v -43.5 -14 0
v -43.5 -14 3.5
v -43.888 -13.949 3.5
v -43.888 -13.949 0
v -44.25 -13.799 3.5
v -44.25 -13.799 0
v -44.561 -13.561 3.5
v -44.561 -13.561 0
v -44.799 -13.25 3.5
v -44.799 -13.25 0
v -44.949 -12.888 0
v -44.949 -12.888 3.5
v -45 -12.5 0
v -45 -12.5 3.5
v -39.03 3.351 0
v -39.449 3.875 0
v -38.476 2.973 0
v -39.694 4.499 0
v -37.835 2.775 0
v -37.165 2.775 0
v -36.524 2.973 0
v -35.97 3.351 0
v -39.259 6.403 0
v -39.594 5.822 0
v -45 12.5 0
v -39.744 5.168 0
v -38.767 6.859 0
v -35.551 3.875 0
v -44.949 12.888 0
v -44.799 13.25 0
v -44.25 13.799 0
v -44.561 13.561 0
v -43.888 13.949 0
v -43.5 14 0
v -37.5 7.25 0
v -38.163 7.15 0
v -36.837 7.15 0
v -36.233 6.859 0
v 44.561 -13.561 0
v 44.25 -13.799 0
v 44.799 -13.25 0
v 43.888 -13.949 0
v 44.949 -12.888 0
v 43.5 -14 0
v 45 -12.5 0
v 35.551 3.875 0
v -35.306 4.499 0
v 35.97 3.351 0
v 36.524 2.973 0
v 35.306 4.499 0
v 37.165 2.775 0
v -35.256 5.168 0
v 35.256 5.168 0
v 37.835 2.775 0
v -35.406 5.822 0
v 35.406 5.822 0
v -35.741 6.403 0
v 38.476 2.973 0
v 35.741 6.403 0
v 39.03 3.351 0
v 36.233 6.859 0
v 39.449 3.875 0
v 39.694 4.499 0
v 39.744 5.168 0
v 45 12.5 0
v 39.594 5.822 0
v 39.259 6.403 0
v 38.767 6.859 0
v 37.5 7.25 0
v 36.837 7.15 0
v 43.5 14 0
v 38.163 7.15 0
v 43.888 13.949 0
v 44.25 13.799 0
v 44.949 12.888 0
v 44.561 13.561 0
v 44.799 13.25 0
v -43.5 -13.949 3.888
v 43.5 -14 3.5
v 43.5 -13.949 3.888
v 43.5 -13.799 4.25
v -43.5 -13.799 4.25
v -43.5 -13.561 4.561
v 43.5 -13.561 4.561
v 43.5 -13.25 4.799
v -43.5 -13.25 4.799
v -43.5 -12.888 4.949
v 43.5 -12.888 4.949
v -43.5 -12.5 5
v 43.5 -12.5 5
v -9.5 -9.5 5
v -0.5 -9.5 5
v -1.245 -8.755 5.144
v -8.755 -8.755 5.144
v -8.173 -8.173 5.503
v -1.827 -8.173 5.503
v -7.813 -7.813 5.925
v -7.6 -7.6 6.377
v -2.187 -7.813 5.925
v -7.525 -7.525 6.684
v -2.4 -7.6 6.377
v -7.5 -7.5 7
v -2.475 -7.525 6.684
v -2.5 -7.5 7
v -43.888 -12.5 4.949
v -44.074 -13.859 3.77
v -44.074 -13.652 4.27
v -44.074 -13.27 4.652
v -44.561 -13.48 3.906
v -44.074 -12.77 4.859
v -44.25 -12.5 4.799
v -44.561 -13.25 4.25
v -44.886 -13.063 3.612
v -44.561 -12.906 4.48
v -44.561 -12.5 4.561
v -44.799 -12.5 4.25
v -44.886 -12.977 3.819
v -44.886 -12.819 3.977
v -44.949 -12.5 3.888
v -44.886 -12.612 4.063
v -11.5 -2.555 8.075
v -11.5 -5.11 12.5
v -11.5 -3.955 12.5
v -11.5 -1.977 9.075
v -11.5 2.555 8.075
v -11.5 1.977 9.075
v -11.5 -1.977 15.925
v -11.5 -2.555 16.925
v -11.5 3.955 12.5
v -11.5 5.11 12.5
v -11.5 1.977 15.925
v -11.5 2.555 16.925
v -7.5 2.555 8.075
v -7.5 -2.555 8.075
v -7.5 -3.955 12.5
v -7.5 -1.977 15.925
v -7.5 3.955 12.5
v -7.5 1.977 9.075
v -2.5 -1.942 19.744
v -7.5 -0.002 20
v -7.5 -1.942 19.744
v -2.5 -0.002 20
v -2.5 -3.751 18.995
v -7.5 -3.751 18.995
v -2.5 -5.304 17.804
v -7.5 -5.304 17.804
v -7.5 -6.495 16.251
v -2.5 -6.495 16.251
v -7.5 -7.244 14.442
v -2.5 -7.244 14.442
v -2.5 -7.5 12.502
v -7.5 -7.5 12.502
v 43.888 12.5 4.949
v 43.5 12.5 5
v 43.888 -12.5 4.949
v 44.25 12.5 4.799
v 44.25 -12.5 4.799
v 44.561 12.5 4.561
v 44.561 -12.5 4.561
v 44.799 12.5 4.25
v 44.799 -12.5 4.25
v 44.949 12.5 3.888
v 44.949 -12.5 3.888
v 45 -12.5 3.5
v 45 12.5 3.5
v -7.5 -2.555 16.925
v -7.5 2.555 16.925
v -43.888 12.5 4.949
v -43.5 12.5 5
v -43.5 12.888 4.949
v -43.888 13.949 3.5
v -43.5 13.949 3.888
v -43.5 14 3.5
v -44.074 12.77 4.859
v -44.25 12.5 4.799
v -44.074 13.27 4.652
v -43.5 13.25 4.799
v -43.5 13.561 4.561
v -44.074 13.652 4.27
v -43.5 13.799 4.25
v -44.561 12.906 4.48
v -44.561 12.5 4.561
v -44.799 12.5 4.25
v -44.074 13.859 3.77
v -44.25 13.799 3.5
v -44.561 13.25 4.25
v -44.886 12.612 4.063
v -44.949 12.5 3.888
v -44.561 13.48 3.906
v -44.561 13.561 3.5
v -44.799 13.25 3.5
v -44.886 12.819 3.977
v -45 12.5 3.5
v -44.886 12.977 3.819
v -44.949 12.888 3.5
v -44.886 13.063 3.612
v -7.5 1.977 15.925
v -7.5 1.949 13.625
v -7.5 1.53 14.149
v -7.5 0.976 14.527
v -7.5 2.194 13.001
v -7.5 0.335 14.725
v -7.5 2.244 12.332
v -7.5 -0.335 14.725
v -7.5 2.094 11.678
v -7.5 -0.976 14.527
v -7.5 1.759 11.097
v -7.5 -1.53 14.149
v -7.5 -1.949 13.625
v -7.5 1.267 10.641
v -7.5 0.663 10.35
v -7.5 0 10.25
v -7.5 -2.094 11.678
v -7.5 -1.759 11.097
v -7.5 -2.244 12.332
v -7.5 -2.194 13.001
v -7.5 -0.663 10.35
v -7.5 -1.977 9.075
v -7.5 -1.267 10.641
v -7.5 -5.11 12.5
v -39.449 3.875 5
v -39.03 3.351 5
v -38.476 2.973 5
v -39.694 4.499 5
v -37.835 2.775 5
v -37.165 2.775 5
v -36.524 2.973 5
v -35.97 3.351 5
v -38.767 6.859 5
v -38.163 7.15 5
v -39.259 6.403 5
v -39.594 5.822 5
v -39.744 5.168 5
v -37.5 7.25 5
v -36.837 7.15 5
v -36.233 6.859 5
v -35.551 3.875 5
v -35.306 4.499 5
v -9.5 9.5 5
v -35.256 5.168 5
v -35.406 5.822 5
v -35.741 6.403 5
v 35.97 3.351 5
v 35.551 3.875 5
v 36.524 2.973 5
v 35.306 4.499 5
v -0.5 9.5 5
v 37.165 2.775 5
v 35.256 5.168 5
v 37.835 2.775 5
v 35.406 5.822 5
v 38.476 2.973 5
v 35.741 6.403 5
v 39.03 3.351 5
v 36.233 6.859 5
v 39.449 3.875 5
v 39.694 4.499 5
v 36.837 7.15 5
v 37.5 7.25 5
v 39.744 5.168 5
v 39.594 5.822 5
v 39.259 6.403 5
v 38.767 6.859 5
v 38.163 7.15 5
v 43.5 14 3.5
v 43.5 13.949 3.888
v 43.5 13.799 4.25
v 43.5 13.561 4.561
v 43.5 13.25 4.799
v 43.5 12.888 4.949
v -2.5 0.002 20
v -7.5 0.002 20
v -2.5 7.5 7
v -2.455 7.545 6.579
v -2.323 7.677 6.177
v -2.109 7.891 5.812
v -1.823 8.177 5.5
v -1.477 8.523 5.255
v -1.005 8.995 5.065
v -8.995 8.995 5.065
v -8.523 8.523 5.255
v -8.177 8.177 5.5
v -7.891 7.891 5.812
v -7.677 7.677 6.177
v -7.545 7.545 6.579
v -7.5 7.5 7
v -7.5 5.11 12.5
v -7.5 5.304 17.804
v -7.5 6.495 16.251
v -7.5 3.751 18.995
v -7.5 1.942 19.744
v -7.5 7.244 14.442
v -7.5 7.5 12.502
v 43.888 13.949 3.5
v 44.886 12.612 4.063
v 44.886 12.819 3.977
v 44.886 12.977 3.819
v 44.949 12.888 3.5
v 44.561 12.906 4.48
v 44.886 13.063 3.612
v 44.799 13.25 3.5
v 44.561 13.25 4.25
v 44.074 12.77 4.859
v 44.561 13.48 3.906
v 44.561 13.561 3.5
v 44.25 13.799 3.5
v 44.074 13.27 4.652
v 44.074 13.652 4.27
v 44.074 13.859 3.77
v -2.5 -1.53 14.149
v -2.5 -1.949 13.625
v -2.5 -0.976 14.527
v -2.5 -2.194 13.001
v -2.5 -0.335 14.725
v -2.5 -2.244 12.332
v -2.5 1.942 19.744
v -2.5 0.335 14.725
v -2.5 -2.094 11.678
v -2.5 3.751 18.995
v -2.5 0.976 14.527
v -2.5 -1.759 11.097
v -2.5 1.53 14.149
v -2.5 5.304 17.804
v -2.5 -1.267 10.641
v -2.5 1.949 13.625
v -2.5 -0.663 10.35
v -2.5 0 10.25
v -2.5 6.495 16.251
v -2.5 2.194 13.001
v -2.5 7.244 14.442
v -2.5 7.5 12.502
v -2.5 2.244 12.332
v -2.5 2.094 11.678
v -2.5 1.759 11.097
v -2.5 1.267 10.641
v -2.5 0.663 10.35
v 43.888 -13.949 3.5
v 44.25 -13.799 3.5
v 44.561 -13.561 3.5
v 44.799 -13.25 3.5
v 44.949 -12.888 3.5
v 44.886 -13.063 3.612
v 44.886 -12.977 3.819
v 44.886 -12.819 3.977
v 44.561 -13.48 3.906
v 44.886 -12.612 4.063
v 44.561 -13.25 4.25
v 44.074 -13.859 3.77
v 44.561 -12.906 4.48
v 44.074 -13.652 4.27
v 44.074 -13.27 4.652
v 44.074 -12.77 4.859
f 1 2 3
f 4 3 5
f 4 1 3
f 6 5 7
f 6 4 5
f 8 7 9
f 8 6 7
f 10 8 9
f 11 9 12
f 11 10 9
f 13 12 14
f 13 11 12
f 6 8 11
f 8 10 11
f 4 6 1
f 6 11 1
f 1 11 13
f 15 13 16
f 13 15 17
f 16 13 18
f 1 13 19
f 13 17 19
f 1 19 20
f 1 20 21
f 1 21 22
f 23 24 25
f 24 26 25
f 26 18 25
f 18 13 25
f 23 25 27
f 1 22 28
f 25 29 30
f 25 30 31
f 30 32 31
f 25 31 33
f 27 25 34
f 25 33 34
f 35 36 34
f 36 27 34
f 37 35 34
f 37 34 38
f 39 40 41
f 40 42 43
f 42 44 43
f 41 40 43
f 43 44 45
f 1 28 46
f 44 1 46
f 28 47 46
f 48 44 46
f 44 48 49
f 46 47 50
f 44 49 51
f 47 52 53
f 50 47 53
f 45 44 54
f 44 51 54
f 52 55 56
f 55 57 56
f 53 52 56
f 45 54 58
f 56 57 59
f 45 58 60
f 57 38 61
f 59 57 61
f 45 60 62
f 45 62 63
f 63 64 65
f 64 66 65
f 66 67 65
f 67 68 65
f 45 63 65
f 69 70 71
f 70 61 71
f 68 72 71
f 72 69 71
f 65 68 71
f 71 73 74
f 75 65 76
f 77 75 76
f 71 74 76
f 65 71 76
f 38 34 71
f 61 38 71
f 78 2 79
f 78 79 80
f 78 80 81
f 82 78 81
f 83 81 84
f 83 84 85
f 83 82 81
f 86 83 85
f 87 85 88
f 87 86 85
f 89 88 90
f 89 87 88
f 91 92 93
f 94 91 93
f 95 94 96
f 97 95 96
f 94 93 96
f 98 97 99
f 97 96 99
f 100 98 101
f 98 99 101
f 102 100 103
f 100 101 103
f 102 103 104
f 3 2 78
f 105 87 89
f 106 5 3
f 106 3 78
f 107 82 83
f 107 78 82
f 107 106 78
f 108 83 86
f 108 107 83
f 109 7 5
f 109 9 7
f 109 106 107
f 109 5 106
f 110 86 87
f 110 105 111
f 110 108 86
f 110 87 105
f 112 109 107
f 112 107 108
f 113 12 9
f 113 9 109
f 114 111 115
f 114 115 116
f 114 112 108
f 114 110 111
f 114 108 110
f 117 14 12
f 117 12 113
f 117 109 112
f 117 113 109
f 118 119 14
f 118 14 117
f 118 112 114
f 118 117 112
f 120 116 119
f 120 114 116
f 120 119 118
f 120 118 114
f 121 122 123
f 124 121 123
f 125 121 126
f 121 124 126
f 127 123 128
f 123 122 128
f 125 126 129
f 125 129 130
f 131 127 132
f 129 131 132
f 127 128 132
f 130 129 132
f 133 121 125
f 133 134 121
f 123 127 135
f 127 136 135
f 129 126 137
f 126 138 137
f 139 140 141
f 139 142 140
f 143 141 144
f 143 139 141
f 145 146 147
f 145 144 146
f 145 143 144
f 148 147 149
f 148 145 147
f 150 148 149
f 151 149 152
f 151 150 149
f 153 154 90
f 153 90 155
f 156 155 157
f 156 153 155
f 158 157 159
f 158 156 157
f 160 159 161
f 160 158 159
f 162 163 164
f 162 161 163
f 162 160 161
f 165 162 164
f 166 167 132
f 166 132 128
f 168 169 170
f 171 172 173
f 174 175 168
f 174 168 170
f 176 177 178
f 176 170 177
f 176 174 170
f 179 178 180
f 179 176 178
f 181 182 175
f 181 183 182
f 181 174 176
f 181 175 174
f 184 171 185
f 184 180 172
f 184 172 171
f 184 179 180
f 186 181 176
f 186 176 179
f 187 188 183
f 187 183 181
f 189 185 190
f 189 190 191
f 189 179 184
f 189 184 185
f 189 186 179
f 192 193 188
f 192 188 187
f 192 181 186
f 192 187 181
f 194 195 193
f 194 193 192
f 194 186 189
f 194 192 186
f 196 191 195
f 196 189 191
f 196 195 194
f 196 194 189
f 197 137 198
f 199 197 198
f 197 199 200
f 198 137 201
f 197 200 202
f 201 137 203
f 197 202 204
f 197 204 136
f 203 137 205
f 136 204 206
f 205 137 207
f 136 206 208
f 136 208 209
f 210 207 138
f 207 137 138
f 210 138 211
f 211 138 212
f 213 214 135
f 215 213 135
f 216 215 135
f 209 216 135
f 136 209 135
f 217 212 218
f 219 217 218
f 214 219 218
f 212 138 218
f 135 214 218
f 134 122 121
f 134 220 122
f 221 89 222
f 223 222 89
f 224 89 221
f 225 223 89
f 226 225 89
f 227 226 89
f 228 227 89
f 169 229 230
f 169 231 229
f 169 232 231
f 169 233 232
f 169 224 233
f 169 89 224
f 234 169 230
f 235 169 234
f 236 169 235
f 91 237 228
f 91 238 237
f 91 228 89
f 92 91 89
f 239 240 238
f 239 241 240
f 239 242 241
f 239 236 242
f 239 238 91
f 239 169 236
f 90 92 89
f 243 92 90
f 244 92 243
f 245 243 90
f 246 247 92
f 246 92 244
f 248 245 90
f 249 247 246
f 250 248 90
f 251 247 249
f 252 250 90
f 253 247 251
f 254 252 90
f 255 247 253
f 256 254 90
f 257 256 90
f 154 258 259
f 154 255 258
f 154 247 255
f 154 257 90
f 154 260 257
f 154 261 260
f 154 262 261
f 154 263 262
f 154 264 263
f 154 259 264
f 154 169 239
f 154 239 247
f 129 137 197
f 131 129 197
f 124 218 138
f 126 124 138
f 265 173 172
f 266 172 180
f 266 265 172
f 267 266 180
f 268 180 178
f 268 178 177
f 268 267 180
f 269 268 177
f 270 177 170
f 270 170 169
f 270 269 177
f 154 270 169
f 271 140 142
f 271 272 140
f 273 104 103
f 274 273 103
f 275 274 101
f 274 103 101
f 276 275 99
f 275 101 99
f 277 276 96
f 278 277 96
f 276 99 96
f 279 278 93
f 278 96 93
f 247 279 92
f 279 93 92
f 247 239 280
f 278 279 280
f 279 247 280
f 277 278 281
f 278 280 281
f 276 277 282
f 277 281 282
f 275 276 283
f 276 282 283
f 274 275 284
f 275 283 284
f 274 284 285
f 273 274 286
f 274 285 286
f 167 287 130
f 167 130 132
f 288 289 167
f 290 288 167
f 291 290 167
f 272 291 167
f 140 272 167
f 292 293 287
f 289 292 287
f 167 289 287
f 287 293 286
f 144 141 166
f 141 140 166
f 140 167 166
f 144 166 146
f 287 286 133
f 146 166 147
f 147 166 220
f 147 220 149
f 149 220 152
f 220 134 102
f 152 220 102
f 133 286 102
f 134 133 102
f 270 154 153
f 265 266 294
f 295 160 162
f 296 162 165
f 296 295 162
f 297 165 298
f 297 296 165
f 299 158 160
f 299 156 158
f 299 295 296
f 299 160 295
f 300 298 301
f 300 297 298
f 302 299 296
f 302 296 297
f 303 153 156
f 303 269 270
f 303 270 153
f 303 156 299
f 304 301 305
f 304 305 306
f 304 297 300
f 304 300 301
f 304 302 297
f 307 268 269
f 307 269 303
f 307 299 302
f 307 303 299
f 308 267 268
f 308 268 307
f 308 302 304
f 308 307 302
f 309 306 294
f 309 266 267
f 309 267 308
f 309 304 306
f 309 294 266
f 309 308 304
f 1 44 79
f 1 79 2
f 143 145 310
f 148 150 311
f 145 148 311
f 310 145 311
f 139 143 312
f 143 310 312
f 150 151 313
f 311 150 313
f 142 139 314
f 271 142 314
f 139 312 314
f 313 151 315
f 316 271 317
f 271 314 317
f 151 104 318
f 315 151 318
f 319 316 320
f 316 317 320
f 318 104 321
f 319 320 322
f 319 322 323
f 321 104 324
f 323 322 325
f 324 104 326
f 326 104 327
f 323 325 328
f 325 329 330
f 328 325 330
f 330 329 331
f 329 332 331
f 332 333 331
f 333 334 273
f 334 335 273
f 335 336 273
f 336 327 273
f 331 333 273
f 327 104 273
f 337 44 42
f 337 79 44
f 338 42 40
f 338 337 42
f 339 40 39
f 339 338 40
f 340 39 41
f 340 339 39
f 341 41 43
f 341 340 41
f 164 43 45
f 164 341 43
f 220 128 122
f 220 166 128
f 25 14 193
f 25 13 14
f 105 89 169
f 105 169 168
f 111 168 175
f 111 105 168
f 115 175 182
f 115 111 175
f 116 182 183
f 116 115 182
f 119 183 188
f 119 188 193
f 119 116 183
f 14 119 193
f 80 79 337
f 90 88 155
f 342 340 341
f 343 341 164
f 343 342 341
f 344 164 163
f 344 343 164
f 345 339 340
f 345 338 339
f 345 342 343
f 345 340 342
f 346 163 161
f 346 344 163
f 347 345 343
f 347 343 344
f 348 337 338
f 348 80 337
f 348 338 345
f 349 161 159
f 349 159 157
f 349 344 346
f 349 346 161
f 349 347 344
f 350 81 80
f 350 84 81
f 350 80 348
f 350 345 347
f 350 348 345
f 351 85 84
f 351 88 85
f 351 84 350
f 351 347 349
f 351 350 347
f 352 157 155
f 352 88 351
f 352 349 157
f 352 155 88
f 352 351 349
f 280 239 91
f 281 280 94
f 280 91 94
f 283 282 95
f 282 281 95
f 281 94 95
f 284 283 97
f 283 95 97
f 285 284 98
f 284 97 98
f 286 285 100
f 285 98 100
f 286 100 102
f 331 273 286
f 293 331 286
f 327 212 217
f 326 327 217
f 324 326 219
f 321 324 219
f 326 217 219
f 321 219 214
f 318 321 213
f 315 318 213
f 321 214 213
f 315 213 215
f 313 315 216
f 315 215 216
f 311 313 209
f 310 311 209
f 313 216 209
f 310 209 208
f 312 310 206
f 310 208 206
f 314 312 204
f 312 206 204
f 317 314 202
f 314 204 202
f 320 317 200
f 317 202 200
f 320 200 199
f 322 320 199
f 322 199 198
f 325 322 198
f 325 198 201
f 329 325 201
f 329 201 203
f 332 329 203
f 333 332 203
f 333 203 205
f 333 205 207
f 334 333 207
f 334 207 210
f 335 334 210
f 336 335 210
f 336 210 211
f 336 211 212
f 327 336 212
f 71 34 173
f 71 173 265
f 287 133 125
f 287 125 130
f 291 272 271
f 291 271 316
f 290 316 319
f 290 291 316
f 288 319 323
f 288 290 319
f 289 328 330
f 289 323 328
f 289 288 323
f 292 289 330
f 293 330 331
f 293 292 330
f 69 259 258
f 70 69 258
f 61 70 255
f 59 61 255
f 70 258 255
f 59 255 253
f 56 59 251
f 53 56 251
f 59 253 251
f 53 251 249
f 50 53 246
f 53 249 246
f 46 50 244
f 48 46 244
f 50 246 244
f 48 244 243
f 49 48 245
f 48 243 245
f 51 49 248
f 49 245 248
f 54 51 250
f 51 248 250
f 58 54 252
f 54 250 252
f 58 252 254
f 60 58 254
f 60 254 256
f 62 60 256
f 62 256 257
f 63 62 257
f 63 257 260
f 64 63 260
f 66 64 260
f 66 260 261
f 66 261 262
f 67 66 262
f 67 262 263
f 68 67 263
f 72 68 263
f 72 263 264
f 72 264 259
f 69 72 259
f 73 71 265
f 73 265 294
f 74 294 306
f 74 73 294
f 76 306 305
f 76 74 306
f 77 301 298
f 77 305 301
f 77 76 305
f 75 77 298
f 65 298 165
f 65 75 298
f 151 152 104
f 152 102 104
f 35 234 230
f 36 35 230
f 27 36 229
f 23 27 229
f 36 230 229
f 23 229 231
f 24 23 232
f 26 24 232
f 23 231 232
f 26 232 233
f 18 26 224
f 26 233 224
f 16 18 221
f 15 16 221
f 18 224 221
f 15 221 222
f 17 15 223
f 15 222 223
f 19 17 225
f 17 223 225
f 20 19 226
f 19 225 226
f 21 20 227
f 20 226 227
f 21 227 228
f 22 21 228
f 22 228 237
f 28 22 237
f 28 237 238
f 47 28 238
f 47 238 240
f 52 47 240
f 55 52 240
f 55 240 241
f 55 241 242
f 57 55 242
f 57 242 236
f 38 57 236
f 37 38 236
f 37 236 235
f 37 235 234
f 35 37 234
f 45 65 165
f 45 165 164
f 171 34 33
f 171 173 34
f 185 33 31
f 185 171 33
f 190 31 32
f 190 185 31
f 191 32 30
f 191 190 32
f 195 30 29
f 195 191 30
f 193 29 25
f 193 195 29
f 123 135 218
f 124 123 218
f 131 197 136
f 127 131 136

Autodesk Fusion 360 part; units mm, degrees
sketch "Sketch1" plane through (0, 0, 0) normal (0, 0, 1) x (1, 0, 0)
  line L0 (-45, 14) -> (45, 14)
  line L1 (45, 14) -> (45, -14)
  line L2 (45, -14) -> (-45, -14)
  line L3 (-45, -14) -> (-45, 14)
  line L4 (-45, 14) -> (45, -14) construction
  line L5 (45, 14) -> (-45, -14) construction
  dimension "d1" = 90
  dimension "d2" = 28
extrude "Extrude1" add sketch "Sketch1" along normal blind 5
sketch "Sketch2" plane through (0, 0, 0) normal (0, 0, 1) x (1, 0, 0)
  line L0 (0, 0) -> (37.5, 0)
  line L1 (0, 0) -> (-37.5, 0)
  circle A0 centre (37.5, 0) radius 2
  circle A1 centre (-37.5, 0) radius 2
  dimension "d5" = 37.5
  dimension "d6" = 37.5
  dimension "d7" = 4
  dimension "d8" = 4
sketch "Sketch3" plane through (0, 0, 0) normal (0, 0, 1) x (1, 0, 0)
  line L0 (0, 0) -> (-37.5, 0)
  circle A0 centre (-37.5, 0) radius 2
  dimension "d11" = 37.5
  dimension "d12" = 4
ref_plane "WorkPlane1" through (0, 0, 5) normal (0, 0, 1) x (1, 0, 0)
sketch "Sketch4" plane through (0, 0, 5) normal (0, 0, 1) x (1, 0, 0)
  line L0 (0, 0) -> (-5, 0)
  line L1 (-2.5, 7.5) -> (-7.5, 7.5)
  line L2 (-7.5, 7.5) -> (-7.5, -7.5)
  line L3 (-7.5, -7.5) -> (-2.5, -7.5)
  line L4 (-2.5, -7.5) -> (-2.5, 7.5)
  line L5 (-2.5, 7.5) -> (-7.5, -7.5) construction
  line L6 (-7.5, 7.5) -> (-2.5, -7.5) construction
  point P0 (-5, 0)
  dimension "d16" = 5
  dimension "d17" = 5
  dimension "d18" = 15
extrude "Extrude4" add sketch "Sketch4" along normal blind 15
sketch "Sketch5" plane through (0, 0, 5) normal (0, 0, 1) x (-1, 0, 0)
  line L0 (2.5, 7.5) -> (7.5, 7.5)
  line L1 (7.5, 7.5) -> (7.5, -7.5)
  line L2 (7.5, -7.5) -> (2.5, -7.5)
  line L3 (2.5, -7.5) -> (2.5, 7.5)
  line L4 (45, 14) -> (-45, 14)
  line L5 (-45, 14) -> (-45, -14)
  line L6 (-45, -14) -> (45, -14)
  line L7 (45, -14) -> (45, 14)
  line L8 (0, 0) -> (-5, 0)
  line L9 (-7.5, -7.5) -> (-2.5, -7.5)
  line L10 (-2.5, -7.5) -> (-2.5, 7.5)
  line L11 (-2.5, 7.5) -> (-7.5, 7.5)
  line L12 (-7.5, 7.5) -> (-7.5, -7.5)
  line L13 (-7.5, -7.5) -> (-2.5, 7.5) construction
  line L14 (-2.5, -7.5) -> (-7.5, 7.5) construction
  point P0 (-5, 0)
  dimension "d23" = 5
  dimension "d24" = 5
  dimension "d25" = 15
hole "Hole1" at (7.5, 0, 9.3622) direction (-1, 0, 0) diameter 4.5 depth 6 tip angle 118
hole "Hole2" at (-2.5, 0, 12.5) direction (-1, 0, 0) diameter 4.5 depth 6 tip angle 118
fillet "Fillet3" radius 1.5 2 edges at (0, 14, 5) (0, -14, 5)
sketch "Sketch6" plane through (0, 0, 0) normal (0, 0, 1) x (1, 0, 0)
  line L0 (0, 0) -> (37.5, 0)
  line L1 (37.5, 0) -> (37.5, 5)
  line L2 (0, 0) -> (-37.5, 0)
  line L3 (-37.5, 0) -> (-37.5, 5)
  dimension "d38" = 37.5
  dimension "d39" = 5
  dimension "d40" = 37.5
  dimension "d41" = 5
hole "Hole3" at (-37.5, 5, 0) direction (0, 0, 1) diameter 4.5 depth 5 tip angle 118
sketch "Sketch7" plane through (0, 0, 0) normal (0, 0, 1) x (1, 0, 0)
  line L0 (0, 0) -> (37.5, 0)
  line L1 (37.5, 0) -> (37.5, 5)
  dimension "d45" = 37.5
  dimension "d46" = 5
hole "Hole4" at (37.5, 5, 0) direction (0, 0, 1) diameter 4.5 depth 5 tip angle 118
fillet "Fillet4" radius 1.5 10 edges at (-45, 14, 1.75) (-45, 13.5607, 4.5607) (-45, 0, 5) (-45, -13.5607, 4.5607) (-45, -14, 1.75) (45, -14, 1.75) (45, -13.5607, 4.5607) (45, 0, 5) (45, 13.5607, 4.5607) (45, 14, 1.75)
fillet "Fillet5" radius 7.5 2 edges at (-5, -7.5, 20) (-5, 7.5, 20)
fillet "Fillet6" radius 2 4 edges at (-5, -7.5, 5) (-2.5, 0, 5) (-5, 7.5, 5) (-7.5, 0, 5)
sketch "Sketch8" plane through (-2.5, 0, 0) normal (1, 0, 0) x (0, 1, 0)
  line L0 (-7.5, 7) -> (7.5, 7)
  line L1 (7.5, 7) -> (7.5, 12.5)
  arc A0 (7.5, 12.5) -> (-7.5, 12.5) centre (0, 12.5) ccw
  line L2 (-7.5, 12.5) -> (-7.5, 7)
  circle A1 centre (0, 12.5) radius 2.25
  line L3 (1.9774, 15.925) -> (-1.9774, 15.925)
  line L4 (-1.9774, 15.925) -> (-3.9548, 12.5)
  line L5 (-3.9548, 12.5) -> (-1.9774, 9.075)
  line L6 (-1.9774, 9.075) -> (1.9774, 9.075)
  line L7 (1.9774, 9.075) -> (3.9548, 12.5)
  line L8 (3.9548, 12.5) -> (1.9774, 15.925)
  line L9 (-5.1095, 12.5) -> (-2.5548, 8.075)
  line L10 (-2.5548, 8.075) -> (2.5548, 8.075)
  line L11 (2.5548, 8.075) -> (5.1095, 12.5)
  line L12 (5.1095, 12.5) -> (2.5548, 16.925)
  line L13 (2.5548, 16.925) -> (-2.5548, 16.925)
  line L14 (-2.5548, 16.925) -> (-5.1095, 12.5)
  point P0 (0, 12.5)
  dimension "d56" = 6.85
  dimension "d57" = 1
extrude "Extrude6" add sketch "Sketch8" against normal blind 4 from surface at -5 contours L9 L10 L11 L12 L13 L14
